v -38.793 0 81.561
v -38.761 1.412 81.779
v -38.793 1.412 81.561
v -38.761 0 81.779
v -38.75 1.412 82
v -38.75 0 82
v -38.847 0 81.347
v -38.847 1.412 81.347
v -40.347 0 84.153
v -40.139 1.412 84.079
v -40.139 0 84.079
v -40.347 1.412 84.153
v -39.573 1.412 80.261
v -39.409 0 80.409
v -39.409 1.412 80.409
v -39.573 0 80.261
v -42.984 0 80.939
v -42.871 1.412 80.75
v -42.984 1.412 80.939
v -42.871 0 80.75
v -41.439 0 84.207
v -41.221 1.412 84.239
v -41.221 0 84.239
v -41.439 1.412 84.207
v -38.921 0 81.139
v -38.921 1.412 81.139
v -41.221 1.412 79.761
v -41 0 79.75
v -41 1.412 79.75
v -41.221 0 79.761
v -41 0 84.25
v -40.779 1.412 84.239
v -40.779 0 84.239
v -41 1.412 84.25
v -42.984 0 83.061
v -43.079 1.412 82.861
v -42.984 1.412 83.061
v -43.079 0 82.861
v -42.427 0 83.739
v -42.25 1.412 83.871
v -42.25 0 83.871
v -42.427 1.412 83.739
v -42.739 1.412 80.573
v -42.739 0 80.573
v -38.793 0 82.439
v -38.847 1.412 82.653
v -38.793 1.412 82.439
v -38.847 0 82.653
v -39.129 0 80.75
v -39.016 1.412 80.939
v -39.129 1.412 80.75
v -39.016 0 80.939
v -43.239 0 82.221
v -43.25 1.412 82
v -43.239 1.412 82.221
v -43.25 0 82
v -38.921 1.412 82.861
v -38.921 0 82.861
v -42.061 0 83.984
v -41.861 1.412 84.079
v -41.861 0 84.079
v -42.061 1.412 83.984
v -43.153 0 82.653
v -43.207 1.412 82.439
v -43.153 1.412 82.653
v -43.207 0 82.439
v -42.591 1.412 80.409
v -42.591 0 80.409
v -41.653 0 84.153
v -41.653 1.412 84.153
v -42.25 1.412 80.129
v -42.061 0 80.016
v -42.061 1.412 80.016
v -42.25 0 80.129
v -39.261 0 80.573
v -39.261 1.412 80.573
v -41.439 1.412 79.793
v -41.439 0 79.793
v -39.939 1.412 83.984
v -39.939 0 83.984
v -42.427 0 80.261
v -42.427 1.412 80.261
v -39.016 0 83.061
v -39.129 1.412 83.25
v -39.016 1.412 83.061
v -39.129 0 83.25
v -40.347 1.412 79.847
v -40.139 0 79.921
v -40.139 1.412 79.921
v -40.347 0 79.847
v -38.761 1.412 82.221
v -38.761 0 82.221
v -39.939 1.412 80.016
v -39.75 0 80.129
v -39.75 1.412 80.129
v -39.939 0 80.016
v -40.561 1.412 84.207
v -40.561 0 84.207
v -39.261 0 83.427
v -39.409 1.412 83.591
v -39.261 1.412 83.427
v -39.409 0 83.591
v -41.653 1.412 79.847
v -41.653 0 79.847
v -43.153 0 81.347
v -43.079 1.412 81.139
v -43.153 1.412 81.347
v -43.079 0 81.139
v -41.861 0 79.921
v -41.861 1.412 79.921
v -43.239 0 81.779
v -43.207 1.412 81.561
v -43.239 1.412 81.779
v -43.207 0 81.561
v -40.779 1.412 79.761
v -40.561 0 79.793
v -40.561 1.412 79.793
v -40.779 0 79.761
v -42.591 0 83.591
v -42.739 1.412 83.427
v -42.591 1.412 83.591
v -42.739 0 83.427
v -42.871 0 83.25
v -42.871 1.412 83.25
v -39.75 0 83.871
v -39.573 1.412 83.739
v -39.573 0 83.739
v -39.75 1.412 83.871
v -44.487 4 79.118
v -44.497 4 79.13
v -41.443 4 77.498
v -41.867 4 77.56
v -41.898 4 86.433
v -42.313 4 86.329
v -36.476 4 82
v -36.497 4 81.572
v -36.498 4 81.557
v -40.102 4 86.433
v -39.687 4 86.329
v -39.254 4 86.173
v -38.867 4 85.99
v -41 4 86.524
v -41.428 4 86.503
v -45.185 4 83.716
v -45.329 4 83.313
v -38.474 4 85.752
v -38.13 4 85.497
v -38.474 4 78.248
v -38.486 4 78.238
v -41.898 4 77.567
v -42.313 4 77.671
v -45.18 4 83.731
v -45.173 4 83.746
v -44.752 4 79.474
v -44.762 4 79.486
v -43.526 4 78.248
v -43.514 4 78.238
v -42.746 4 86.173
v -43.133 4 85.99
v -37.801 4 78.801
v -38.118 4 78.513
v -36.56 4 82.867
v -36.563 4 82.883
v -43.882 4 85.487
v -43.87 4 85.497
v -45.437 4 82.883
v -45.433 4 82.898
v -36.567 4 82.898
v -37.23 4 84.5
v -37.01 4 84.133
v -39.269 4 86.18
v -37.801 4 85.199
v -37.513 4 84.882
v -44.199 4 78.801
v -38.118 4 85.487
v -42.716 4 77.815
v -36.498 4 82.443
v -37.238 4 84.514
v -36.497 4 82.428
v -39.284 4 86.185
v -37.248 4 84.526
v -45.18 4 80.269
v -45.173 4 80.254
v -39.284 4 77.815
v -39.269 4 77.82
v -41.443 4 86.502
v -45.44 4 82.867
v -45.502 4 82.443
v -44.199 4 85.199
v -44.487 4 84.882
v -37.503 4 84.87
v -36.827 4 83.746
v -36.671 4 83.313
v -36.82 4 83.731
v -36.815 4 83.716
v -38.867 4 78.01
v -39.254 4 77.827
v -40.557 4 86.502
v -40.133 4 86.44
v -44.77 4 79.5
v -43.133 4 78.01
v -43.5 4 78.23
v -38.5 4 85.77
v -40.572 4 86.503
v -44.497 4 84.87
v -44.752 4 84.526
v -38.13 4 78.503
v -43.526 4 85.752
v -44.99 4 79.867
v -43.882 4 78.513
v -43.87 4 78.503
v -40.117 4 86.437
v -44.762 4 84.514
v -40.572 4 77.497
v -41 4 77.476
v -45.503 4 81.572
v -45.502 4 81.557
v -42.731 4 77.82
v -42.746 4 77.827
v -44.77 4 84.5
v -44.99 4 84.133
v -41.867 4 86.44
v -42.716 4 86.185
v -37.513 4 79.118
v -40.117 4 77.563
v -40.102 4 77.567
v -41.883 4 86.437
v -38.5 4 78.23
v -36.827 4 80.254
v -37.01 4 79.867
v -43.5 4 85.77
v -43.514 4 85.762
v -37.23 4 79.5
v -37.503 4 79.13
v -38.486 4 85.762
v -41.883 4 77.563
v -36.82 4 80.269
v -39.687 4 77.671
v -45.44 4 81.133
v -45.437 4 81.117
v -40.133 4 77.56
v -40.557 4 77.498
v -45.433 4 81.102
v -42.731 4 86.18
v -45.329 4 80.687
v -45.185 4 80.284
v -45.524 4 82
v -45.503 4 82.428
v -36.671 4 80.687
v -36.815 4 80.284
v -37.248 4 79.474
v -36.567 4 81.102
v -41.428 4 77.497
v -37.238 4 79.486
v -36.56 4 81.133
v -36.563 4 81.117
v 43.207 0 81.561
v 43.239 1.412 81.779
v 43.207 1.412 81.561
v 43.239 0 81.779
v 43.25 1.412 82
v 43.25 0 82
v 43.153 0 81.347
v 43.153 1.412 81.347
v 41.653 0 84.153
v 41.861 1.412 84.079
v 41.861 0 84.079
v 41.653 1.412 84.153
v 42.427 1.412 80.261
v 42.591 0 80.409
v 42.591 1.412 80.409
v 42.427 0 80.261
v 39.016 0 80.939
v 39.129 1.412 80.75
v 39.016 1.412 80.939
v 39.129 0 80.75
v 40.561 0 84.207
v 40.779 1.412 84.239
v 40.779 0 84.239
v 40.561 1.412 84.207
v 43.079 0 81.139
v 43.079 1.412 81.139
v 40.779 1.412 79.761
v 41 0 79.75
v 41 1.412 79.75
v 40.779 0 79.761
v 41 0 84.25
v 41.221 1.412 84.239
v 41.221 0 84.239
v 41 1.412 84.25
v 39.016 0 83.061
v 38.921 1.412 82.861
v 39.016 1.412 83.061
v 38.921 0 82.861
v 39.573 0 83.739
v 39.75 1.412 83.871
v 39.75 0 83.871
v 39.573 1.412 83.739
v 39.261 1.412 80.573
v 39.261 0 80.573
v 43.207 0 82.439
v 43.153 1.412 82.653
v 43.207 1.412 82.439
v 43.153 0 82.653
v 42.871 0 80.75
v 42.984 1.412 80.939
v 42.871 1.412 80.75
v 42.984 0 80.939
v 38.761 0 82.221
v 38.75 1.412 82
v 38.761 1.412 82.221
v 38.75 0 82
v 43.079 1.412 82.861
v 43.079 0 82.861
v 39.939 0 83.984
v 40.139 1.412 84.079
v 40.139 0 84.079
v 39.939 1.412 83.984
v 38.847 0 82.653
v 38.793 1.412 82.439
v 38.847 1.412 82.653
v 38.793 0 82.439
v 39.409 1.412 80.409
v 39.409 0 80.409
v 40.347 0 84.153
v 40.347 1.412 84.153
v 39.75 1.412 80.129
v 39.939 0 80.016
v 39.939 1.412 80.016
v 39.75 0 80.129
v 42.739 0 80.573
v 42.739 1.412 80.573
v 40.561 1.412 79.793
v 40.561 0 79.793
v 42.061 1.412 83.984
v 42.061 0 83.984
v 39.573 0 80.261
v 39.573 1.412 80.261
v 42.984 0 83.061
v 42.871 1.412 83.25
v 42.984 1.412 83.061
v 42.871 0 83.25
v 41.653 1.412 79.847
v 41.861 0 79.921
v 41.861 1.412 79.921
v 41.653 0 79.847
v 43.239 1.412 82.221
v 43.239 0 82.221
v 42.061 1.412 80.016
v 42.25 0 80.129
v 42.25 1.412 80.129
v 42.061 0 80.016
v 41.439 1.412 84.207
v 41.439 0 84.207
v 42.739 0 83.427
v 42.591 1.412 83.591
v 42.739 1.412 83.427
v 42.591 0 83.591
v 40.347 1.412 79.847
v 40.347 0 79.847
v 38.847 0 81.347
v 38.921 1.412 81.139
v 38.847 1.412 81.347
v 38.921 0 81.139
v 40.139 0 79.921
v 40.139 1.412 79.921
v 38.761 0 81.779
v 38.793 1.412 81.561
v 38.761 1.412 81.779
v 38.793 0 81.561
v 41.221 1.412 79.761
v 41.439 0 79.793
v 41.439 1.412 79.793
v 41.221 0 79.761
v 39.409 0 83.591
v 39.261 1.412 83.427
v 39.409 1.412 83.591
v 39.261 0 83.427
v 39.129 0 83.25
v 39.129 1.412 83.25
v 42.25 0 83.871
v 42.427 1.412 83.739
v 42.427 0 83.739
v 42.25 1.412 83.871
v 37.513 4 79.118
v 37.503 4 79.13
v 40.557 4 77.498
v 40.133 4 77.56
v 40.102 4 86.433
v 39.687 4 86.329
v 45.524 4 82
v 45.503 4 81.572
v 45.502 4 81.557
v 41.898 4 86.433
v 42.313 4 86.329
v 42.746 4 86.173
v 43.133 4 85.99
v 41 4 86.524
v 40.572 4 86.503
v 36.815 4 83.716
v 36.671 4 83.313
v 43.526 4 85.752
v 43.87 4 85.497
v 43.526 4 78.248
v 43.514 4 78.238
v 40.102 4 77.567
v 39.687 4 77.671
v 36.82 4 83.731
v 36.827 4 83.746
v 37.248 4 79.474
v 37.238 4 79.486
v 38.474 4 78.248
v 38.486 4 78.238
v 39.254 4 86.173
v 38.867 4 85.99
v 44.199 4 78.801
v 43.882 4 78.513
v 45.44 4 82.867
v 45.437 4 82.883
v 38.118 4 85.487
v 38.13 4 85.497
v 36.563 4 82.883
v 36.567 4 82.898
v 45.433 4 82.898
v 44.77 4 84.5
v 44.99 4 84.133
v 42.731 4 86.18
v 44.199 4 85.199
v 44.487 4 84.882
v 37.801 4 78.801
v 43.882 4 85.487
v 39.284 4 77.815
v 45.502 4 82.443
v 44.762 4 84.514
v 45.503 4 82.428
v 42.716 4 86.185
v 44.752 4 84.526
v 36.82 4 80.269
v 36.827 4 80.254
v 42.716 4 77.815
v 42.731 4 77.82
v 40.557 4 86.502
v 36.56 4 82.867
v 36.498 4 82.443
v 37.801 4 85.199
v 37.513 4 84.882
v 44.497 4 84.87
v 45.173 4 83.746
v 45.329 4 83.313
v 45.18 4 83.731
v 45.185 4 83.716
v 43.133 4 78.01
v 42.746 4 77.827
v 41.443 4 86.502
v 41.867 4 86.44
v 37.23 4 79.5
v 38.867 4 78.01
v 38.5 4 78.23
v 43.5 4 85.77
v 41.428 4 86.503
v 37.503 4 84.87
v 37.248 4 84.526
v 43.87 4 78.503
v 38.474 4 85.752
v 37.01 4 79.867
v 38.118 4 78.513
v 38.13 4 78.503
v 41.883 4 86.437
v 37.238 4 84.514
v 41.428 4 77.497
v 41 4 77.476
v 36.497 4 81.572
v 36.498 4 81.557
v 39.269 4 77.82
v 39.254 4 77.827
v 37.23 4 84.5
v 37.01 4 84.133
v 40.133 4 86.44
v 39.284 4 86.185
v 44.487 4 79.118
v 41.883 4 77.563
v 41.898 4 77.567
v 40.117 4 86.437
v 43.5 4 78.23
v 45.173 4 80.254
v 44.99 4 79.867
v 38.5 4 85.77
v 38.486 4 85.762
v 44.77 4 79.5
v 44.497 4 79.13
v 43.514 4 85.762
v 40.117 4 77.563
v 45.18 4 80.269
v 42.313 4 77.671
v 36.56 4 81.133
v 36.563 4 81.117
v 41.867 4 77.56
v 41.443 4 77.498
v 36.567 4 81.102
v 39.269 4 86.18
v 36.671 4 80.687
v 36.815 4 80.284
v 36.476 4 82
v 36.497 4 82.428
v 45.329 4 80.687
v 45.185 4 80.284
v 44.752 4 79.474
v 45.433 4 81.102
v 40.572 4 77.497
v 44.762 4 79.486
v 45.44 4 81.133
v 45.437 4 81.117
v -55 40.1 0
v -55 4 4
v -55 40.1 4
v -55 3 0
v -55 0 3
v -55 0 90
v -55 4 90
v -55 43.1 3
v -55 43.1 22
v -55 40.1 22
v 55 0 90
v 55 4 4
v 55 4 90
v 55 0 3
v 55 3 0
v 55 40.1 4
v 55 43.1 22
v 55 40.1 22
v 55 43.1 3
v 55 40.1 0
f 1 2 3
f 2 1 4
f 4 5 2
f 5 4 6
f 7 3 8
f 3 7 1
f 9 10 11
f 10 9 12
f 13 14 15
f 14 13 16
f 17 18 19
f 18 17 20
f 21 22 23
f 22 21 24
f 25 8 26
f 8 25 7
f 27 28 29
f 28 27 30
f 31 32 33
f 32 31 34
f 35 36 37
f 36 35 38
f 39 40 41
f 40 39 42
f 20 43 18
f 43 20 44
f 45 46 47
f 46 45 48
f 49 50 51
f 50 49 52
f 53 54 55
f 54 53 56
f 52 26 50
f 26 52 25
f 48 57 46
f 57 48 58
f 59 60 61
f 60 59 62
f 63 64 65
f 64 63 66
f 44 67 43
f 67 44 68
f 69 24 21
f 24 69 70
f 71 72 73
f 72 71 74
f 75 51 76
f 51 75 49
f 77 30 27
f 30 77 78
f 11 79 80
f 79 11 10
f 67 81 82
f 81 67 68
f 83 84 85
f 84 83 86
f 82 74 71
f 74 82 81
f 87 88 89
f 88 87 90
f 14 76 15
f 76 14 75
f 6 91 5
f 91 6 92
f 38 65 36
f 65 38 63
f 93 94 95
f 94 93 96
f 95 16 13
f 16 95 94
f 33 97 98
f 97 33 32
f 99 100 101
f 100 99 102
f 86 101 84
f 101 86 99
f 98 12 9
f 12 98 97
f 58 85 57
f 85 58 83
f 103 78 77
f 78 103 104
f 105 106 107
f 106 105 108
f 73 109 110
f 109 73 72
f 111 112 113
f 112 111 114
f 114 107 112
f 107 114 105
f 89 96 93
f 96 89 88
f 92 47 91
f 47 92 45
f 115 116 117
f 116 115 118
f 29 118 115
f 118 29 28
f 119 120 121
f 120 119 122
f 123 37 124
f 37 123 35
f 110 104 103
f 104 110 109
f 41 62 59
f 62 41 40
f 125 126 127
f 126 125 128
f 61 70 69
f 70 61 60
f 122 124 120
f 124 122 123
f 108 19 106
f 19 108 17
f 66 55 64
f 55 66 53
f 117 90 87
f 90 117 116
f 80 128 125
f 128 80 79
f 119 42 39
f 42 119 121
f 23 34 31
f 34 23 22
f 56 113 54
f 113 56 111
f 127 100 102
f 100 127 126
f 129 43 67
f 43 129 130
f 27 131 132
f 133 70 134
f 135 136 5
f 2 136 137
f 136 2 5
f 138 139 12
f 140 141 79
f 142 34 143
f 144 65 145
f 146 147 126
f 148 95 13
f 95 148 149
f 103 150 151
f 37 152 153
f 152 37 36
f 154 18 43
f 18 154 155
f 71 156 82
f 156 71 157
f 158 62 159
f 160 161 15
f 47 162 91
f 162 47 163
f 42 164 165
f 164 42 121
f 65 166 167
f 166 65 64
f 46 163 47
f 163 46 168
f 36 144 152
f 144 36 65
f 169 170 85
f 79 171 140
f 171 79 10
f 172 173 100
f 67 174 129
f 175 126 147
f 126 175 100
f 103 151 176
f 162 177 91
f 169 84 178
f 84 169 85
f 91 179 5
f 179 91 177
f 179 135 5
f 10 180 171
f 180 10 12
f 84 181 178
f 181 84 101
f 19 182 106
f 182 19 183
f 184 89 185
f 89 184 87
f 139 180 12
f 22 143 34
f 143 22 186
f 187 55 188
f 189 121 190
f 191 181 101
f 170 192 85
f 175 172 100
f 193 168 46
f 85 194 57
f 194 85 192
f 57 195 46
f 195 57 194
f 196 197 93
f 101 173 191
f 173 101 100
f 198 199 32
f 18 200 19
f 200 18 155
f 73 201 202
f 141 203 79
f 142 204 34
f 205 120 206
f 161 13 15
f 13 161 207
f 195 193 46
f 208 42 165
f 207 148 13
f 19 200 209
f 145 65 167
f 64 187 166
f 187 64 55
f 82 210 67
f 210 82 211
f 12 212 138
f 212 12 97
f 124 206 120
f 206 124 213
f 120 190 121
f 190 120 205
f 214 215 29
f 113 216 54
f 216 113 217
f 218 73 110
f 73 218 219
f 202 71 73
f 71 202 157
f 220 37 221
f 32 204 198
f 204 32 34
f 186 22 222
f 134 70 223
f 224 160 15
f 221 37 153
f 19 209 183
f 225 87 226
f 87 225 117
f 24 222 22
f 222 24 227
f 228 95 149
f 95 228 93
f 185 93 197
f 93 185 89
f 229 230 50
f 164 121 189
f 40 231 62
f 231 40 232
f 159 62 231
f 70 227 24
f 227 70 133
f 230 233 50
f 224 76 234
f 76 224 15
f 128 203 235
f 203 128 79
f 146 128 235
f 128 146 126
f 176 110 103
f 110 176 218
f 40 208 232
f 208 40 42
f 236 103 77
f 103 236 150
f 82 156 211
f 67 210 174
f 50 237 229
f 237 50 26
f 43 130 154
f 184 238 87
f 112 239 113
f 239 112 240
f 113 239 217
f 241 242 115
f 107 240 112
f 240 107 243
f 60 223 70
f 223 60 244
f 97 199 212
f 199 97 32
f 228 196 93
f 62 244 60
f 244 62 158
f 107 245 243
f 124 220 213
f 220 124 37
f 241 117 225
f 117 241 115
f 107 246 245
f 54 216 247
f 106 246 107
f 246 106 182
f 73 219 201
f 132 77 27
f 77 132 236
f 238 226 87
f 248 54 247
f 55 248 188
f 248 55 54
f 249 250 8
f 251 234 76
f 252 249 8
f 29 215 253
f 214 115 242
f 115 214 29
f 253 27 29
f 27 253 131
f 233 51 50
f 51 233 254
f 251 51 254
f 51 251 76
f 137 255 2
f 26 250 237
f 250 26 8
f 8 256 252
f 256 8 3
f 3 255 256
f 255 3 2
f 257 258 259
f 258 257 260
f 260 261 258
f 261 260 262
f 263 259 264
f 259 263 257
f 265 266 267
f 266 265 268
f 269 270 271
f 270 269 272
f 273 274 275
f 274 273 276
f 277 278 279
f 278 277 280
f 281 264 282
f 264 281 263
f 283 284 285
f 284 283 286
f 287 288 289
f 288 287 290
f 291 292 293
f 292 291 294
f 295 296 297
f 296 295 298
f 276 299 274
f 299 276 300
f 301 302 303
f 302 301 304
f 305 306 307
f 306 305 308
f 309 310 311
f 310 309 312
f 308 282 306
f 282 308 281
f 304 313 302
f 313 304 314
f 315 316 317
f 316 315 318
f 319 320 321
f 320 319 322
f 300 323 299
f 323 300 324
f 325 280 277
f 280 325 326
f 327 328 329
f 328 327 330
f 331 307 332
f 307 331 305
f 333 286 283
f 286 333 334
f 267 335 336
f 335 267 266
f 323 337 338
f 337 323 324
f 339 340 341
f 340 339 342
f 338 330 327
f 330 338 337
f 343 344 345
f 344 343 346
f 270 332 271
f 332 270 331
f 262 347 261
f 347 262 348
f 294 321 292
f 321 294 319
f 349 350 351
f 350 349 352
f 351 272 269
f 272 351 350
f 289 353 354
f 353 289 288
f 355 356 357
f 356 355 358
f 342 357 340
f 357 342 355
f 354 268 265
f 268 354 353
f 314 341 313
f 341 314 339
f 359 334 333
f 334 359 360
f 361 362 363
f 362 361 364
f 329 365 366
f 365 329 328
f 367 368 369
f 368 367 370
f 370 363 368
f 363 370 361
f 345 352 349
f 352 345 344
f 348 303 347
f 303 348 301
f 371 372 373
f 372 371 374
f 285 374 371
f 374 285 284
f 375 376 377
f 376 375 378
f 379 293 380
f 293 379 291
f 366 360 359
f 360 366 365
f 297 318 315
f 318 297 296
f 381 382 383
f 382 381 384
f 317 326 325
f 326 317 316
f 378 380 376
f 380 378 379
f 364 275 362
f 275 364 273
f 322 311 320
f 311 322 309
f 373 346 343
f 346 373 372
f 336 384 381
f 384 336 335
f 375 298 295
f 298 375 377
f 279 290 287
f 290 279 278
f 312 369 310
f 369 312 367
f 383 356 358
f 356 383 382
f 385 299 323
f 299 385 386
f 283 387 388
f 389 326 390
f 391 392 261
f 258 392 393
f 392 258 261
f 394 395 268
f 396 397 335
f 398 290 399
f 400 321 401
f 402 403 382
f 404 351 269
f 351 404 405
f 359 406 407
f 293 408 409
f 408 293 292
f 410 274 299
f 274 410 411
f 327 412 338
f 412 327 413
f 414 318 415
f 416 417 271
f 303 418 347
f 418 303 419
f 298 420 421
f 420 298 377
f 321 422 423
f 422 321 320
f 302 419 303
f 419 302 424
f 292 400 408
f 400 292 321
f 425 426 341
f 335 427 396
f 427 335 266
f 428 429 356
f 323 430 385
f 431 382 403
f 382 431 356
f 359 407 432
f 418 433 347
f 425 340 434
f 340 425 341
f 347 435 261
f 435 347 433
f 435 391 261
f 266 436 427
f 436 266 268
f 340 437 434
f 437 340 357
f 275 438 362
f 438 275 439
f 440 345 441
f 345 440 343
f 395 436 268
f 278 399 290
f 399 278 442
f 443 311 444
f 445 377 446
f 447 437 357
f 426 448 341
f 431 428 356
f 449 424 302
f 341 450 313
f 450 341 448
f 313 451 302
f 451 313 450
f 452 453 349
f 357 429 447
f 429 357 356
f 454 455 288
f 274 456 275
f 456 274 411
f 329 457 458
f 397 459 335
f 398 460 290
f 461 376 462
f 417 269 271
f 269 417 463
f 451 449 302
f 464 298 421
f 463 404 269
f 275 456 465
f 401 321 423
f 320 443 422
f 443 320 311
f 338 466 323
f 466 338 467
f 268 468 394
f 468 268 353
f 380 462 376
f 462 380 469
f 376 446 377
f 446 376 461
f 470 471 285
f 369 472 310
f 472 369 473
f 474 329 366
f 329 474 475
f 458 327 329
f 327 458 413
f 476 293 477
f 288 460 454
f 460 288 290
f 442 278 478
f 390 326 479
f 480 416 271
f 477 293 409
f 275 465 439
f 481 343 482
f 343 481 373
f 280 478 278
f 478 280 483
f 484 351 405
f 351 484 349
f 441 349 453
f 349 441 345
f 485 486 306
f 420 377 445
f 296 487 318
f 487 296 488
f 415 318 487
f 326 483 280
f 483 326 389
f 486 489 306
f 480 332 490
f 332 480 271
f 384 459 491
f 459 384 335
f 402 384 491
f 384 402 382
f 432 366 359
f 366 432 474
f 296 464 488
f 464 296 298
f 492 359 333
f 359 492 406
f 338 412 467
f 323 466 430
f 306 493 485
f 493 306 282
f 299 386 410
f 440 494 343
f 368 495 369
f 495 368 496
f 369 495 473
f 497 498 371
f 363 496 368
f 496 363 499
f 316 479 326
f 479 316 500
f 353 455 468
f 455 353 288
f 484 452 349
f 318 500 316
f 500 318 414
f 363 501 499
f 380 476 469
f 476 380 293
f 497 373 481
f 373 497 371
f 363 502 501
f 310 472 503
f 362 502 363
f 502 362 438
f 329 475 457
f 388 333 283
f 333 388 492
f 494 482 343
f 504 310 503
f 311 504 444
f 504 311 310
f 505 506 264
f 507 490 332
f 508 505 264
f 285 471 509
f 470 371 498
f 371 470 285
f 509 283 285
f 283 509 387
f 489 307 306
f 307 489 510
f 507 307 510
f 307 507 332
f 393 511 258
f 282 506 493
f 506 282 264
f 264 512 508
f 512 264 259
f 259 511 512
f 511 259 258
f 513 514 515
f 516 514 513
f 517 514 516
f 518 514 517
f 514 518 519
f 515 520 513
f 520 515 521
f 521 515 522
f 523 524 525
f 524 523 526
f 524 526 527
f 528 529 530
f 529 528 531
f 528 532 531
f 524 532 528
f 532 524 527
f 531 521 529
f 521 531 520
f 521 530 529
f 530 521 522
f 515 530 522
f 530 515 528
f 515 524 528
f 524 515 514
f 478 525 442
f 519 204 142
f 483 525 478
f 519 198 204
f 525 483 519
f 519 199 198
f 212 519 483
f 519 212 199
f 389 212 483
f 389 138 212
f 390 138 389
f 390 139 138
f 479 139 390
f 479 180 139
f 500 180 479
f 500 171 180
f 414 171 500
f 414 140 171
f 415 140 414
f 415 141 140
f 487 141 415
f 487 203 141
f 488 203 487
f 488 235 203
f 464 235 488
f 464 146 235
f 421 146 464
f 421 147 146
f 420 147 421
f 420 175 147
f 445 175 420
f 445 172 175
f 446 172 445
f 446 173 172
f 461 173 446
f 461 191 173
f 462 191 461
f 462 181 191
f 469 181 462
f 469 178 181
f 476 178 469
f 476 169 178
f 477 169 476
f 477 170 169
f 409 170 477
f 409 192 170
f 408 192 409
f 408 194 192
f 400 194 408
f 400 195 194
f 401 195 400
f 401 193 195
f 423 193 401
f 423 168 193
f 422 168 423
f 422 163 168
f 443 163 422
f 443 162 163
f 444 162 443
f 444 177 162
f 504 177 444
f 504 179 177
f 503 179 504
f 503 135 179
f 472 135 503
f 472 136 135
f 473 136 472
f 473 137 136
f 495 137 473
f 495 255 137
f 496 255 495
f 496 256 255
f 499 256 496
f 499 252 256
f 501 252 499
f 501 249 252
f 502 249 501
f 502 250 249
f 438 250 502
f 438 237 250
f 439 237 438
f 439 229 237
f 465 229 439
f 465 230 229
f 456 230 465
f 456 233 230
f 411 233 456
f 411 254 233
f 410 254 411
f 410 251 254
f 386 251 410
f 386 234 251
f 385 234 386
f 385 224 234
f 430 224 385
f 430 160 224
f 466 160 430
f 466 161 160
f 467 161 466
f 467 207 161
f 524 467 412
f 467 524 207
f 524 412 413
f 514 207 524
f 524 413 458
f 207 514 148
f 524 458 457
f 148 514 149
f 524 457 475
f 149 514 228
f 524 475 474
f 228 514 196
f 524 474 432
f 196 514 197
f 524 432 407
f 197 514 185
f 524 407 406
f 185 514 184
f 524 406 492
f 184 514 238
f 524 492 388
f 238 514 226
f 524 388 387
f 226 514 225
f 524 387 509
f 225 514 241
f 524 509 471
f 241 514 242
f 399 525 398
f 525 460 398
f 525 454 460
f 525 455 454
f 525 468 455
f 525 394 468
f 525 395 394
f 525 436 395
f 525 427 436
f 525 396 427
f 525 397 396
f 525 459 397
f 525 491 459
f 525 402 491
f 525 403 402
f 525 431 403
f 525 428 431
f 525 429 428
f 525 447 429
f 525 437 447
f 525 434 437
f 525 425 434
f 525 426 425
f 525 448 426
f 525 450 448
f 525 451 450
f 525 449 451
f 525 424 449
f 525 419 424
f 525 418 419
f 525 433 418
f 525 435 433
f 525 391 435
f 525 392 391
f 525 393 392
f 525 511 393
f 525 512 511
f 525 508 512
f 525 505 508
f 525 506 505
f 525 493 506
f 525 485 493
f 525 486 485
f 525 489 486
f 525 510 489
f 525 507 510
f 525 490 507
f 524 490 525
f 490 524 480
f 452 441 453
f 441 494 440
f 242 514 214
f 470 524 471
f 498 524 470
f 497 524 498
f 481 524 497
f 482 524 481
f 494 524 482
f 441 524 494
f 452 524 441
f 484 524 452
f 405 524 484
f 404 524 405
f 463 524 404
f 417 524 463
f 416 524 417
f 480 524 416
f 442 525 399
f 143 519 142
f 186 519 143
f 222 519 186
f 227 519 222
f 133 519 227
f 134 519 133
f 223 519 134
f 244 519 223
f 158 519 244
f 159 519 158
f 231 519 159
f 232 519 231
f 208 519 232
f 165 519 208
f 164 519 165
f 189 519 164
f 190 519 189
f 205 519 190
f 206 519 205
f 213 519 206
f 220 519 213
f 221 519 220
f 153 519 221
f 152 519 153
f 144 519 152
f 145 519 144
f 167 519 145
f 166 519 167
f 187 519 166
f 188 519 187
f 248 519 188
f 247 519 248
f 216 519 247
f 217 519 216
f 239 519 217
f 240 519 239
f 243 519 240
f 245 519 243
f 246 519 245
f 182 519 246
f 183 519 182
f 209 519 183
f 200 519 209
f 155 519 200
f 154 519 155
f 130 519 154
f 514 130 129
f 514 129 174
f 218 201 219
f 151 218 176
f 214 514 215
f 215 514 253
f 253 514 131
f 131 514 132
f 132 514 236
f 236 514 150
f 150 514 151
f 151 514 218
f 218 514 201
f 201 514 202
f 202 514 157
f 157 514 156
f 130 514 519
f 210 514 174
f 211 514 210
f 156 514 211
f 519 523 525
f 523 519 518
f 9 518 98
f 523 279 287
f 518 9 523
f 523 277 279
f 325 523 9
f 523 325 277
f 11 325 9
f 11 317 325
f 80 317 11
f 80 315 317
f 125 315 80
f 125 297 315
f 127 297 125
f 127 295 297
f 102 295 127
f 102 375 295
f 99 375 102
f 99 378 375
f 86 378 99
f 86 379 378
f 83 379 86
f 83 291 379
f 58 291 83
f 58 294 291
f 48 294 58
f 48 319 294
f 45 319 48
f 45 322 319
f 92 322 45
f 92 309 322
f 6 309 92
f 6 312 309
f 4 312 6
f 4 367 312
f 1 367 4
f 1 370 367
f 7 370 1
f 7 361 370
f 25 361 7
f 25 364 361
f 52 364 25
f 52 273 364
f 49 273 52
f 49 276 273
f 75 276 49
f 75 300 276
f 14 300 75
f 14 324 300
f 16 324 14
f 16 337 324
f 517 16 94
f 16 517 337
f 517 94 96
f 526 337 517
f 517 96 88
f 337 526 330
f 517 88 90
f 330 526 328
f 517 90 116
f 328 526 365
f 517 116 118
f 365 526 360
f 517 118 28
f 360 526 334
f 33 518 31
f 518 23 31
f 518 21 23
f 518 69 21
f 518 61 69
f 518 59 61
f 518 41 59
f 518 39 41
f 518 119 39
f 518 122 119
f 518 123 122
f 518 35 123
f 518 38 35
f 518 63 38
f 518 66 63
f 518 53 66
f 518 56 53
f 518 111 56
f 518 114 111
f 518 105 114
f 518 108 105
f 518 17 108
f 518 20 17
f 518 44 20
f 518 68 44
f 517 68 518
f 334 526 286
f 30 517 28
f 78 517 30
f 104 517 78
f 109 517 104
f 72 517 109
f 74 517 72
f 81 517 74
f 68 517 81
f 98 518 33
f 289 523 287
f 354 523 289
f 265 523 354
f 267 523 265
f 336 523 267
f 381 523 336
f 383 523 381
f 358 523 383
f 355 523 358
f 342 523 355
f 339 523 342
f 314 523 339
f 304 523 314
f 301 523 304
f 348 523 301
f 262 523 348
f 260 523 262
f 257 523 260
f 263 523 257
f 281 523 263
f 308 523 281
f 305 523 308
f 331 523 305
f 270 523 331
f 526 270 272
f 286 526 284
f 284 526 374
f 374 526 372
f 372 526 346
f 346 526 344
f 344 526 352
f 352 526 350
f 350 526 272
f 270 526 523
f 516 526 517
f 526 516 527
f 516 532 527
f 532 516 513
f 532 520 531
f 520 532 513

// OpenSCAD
// ============================================================================
// Raspberry Pi 4 case -> wall-mount cradle (ikea-type shelf side wall)
// Mounted pose: case flat against the wall, power/HDMI edge UP, dropped into a
// bottom cradle (floor + short front lip). Back plate screws to the shelf board
// with countersunk wood screws. 45-deg chamfers on the bottom edges match the
// case's bottom chamfers.
//
// Coords: X = horizontal (along wall), Y = out from wall, Z = up.
// Built as a chamfered Y-Z cross-section extruded along X. Units: mm.
// ============================================================================

/* ===== CASE (measured, assembled, as mounted) ===== */
case_w = 108;    // horizontal width against the wall
case_h = 70;     // vertical height as mounted
case_d = 35.5;   // depth out from the wall (thickness)
fit    = 0.6;    // clearance around the case in the cradle

/* ===== BACK PLATE ===== */
plate_th   = 4;    // plate thickness
top_margin = 16;   // plate strip above the case (carries the screws)
side_clear = 1;    // clearance each side of the case in the cradle

/* ===== CRADLE (the hook) ===== */
floor_th = 4;   // bottom shelf thickness
lip_th   = 3;   // front retaining lip thickness
lip_h    = 18;  // front lip height above the floor

/* ===== BOTTOM CHAMFER (match the case) ===== */
chamfer = 3;    // 45-deg chamfer on the bottom edges

/* ===== WOOD SCREWS (countersunk; 1" #8 into ~1.5" board) ===== */
screw_shank_d = 4.5;
head_d        = 9.0;
cs_angle      = 82;    // US flat-head taper
screw_inset   = 14;    // screw center in from the side edges

show_case_ghost = true;
$fn = 64;

/* ===== derived ===== */
cd = case_d + fit;                       // cradle inner depth
bw = case_w + 2*side_clear;              // bracket width (uniform)
y1 = plate_th;                           // plate front / case back
y2 = plate_th + cd;                      // case front / lip inner
y3 = plate_th + cd + lip_th;             // lip outer / front face
zf = floor_th;                           // floor top / case bottom
zl = floor_th + lip_h;                   // lip top
zp = floor_th + case_h + top_margin;     // plate top
cs_depth = (head_d - screw_shank_d)/2 / tan(cs_angle/2);
screw_z  = zp - top_margin/2;

// Y-Z profile of the bracket, bottom corners chamfered at 45 deg
profile = [
    [chamfer, 0], [y3 - chamfer, 0], [y3, chamfer],
    [y3, zl], [y2, zl], [y2, zf], [y1, zf], [y1, zp],
    [0, zp], [0, chamfer]
];

module countersunk_hole(x) {
    translate([x, 0, screw_z]) rotate([-90, 0, 0]) {
        translate([0, 0, -1]) cylinder(d=screw_shank_d, h=plate_th + 2);
        translate([0, 0, plate_th - cs_depth])
            cylinder(d1=screw_shank_d, d2=head_d + 0.4, h=cs_depth + 0.2);
    }
}

difference() {
    // extrude the chamfered profile across the bracket width
    translate([-bw/2, 0, 0]) rotate([90, 0, 90])
        linear_extrude(bw) polygon(profile);
    countersunk_hole(-(bw/2 - screw_inset));
    countersunk_hole( (bw/2 - screw_inset));
}

if (show_case_ghost)
    %translate([-case_w/2, plate_th, floor_th]) cube([case_w, case_d, case_h]);
